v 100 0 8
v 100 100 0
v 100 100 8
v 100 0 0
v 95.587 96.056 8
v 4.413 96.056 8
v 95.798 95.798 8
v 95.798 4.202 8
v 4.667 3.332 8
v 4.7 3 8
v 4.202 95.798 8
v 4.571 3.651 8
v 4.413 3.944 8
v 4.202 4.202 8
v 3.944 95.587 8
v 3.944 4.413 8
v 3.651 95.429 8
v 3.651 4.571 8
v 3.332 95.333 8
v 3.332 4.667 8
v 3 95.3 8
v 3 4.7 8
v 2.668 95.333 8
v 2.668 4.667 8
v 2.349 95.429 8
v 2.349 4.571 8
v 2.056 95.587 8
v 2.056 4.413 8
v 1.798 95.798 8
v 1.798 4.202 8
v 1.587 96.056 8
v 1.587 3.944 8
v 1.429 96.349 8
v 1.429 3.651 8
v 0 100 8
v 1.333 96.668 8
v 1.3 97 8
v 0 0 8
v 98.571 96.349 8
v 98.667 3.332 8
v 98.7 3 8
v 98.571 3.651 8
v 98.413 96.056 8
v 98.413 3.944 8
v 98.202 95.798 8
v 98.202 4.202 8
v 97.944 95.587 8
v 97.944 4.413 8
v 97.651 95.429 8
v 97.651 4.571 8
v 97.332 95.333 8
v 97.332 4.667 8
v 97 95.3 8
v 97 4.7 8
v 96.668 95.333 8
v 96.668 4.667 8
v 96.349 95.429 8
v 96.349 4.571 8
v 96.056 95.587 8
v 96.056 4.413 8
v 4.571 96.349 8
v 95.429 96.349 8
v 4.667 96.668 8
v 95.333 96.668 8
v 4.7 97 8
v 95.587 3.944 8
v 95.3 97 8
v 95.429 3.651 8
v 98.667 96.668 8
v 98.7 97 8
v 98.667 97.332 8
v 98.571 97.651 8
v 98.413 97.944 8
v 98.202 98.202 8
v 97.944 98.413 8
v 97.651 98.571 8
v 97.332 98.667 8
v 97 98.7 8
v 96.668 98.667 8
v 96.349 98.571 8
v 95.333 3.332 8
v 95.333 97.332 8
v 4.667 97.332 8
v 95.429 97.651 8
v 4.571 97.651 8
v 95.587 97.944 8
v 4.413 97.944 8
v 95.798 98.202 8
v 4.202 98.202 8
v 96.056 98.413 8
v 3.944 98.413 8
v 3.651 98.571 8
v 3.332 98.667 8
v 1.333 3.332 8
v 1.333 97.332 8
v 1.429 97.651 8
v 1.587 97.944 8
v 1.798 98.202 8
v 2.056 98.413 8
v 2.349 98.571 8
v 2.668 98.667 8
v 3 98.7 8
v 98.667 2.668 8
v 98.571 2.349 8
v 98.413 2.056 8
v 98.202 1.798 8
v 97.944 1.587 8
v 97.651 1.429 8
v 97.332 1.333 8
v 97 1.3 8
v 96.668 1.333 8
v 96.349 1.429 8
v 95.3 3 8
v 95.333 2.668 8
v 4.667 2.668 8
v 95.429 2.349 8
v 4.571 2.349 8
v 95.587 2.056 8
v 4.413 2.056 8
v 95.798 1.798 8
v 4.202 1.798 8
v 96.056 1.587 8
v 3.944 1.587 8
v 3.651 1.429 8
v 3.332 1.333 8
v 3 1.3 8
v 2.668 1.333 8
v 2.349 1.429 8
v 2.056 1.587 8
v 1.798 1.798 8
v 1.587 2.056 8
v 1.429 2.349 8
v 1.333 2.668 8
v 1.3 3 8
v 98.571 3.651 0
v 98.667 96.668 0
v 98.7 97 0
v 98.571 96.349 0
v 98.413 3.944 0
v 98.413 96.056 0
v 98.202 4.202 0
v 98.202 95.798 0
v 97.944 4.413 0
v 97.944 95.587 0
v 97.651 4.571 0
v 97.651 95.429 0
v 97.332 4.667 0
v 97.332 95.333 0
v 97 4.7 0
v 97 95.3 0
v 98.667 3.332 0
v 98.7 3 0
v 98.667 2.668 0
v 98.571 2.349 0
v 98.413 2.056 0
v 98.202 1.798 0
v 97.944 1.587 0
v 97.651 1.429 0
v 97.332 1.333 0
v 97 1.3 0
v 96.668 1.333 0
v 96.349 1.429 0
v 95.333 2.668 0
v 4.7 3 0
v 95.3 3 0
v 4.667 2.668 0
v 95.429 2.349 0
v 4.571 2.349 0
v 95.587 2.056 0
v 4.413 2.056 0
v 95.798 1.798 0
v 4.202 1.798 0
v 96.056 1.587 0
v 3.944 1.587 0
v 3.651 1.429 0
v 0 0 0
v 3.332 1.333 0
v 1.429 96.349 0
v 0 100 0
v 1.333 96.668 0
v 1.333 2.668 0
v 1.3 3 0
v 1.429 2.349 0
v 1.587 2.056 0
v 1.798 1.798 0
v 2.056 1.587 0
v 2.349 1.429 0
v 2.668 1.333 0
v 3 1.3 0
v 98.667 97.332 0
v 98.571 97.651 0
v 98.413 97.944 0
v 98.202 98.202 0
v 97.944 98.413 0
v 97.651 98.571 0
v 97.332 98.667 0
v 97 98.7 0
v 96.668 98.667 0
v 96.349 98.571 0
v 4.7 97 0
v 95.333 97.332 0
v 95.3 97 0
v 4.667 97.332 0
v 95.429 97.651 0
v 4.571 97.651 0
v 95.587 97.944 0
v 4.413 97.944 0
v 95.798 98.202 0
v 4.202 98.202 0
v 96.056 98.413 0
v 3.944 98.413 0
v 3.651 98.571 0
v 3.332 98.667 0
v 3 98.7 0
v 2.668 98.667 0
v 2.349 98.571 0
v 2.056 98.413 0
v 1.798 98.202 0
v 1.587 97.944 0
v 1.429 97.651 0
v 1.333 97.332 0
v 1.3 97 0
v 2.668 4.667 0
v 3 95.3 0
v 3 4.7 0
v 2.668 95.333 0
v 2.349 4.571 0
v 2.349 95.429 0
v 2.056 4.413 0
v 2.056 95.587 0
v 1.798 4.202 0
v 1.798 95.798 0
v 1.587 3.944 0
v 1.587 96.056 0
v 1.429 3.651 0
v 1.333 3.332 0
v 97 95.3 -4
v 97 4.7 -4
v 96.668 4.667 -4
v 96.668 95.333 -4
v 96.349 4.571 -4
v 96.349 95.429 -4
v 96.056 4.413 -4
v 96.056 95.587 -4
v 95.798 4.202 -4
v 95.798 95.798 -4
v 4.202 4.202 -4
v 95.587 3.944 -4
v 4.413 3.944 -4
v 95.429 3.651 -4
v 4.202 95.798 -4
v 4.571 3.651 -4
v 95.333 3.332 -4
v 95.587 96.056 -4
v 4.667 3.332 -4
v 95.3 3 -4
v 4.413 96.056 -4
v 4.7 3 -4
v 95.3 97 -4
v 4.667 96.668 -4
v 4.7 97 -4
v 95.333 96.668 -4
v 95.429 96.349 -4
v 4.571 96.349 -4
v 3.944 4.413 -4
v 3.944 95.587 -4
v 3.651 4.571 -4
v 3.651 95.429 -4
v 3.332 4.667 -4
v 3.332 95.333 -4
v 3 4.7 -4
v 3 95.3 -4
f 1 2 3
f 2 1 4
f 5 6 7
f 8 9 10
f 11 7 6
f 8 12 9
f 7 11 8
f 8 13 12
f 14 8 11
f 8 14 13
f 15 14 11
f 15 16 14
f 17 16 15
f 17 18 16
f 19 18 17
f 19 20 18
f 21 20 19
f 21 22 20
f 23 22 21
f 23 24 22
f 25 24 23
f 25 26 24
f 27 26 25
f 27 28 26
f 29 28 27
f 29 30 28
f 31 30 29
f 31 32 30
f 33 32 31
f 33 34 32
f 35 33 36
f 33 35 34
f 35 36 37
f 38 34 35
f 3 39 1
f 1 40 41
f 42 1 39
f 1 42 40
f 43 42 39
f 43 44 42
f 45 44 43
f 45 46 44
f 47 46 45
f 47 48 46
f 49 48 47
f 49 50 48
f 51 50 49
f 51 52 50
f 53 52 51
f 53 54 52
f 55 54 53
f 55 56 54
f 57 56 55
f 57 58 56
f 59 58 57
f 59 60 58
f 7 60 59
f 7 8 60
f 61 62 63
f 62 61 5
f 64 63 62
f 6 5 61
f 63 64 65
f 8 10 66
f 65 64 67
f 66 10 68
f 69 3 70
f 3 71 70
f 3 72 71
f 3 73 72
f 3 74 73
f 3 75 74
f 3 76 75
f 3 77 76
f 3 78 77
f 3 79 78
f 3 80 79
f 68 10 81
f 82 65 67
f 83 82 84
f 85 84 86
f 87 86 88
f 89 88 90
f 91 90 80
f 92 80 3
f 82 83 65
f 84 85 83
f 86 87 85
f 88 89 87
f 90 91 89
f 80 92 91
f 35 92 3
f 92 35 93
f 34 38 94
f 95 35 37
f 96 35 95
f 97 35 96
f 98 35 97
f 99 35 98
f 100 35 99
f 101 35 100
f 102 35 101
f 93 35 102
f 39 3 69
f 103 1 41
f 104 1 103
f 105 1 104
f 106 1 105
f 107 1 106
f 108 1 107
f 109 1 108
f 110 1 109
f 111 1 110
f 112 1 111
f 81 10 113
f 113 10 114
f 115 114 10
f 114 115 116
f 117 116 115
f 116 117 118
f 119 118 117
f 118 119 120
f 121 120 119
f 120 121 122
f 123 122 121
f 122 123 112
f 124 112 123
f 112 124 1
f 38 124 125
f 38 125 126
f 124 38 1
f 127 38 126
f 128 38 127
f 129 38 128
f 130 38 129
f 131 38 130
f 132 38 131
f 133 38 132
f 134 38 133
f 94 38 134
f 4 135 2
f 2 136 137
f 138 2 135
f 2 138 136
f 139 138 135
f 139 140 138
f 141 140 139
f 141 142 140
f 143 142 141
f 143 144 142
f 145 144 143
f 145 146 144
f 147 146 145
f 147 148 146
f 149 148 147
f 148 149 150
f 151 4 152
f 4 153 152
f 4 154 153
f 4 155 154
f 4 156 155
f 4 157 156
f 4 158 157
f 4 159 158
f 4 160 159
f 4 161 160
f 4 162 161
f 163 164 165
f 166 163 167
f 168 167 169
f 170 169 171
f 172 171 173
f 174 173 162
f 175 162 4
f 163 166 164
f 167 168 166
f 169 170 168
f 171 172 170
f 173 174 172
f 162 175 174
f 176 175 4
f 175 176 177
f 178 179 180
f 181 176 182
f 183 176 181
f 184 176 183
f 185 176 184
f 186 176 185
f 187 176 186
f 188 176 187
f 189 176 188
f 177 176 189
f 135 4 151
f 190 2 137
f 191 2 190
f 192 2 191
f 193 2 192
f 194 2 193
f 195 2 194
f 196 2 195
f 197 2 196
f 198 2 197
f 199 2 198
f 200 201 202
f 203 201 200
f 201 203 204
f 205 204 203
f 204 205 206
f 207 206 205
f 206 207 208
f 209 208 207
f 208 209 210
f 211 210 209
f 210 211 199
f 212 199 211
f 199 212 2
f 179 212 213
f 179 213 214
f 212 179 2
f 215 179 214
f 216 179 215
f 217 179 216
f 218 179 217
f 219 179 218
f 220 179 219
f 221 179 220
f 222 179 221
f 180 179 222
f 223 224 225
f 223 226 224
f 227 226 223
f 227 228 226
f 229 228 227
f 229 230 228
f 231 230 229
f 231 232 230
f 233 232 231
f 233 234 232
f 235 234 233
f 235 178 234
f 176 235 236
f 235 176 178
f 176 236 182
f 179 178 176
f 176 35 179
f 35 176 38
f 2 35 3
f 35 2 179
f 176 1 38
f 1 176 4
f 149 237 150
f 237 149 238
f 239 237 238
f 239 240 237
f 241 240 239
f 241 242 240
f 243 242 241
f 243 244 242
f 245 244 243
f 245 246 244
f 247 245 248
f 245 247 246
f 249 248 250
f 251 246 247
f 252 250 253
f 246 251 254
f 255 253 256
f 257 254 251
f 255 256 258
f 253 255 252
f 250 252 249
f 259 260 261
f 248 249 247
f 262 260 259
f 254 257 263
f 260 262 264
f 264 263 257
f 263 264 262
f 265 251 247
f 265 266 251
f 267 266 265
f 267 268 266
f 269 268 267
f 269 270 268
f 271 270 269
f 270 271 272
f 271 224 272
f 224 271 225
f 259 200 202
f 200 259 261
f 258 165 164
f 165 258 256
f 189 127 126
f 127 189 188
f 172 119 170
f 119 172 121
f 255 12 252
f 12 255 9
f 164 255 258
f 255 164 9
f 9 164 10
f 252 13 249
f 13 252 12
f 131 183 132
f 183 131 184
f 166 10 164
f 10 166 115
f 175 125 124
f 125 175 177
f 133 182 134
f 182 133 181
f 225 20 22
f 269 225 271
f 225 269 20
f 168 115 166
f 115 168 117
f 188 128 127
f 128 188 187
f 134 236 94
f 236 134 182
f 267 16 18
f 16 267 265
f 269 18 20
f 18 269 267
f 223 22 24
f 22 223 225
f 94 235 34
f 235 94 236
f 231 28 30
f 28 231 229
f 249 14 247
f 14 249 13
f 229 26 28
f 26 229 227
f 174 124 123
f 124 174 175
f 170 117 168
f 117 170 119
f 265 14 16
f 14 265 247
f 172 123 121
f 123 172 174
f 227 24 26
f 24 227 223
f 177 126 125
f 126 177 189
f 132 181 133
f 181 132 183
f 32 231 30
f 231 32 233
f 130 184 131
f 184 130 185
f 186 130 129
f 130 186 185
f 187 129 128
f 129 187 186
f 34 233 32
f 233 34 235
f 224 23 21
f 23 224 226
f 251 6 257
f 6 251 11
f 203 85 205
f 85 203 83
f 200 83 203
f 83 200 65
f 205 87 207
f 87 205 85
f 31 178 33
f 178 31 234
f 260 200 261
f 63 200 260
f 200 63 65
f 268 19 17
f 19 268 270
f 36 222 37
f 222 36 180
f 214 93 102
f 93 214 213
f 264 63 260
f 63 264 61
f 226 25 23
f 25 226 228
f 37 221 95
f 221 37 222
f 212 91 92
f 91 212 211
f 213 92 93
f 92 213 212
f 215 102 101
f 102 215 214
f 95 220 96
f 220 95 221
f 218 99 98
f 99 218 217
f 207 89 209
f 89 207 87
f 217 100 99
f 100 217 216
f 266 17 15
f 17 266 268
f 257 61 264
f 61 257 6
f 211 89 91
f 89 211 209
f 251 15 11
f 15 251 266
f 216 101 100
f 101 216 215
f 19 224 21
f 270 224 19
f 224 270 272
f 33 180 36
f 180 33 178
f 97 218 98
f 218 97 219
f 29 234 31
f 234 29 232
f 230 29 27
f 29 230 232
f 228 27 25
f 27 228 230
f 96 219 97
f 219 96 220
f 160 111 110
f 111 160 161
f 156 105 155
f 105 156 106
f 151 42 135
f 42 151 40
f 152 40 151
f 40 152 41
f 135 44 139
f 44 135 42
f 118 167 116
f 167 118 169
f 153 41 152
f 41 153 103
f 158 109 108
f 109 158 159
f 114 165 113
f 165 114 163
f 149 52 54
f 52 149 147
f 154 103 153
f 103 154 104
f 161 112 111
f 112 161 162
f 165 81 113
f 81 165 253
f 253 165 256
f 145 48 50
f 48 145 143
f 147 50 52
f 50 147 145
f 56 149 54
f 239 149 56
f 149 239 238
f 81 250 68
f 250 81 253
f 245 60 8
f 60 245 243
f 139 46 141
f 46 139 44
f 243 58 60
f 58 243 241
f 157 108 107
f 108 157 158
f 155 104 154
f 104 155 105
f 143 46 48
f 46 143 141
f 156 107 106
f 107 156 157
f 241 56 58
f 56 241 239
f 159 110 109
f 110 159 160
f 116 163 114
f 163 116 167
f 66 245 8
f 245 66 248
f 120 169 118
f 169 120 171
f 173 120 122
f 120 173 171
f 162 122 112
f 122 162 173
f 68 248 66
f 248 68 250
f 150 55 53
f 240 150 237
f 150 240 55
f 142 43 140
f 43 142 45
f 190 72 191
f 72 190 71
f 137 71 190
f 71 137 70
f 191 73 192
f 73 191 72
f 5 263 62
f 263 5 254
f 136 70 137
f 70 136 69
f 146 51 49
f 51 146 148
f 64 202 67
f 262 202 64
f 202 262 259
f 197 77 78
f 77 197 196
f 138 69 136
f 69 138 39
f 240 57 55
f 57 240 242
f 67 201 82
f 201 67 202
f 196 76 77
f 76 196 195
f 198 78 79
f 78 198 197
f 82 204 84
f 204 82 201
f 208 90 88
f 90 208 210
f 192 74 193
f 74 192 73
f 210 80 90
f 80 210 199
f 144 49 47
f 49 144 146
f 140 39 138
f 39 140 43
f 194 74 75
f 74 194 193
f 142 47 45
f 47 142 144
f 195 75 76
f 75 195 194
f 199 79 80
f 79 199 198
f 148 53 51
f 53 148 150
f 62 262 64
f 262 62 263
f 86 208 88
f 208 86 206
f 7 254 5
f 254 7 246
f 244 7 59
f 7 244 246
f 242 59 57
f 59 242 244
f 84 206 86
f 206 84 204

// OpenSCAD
$fn = 32;

// ----------------------------------------------------------------------
// Enclosure lid: 100 x 100 x 8 mm, 4 bolt holes
// ----------------------------------------------------------------------

// --- parameters (mm) ---
length = 100;             // lid length, X
width = 100;              // lid width, Y
plate_t = 8;              // lid plate thickness
bolt_d = 3.4;             // bolt clearance
boss_lip = 3;             // bolt hole inset from the corner
sink = 1;                 // overlap of the lip and ribs into the plate
lip_h = 5;                // lip height below the plate
lip_wall = 3;             // lip wall thickness

module plate() {
  cube([length, width, plate_t]);
  /* lip that drops into the housing opening, sunk into the plate */
  translate([lip_wall, lip_wall, -lip_h + sink]) cube([length - 2 * lip_wall, width - 2 * lip_wall, lip_h]);
}

difference() {
  plate();
  /* bolt pattern matching the corner bosses */
  for (sx = [0, 1]) for (sy = [0, 1])
    translate([sx * (length - 2 * boss_lip) + boss_lip, sy * (width - 2 * boss_lip) + boss_lip, -lip_h - 1])
      cylinder(h = plate_t + lip_h + 2, d = bolt_d);
}
